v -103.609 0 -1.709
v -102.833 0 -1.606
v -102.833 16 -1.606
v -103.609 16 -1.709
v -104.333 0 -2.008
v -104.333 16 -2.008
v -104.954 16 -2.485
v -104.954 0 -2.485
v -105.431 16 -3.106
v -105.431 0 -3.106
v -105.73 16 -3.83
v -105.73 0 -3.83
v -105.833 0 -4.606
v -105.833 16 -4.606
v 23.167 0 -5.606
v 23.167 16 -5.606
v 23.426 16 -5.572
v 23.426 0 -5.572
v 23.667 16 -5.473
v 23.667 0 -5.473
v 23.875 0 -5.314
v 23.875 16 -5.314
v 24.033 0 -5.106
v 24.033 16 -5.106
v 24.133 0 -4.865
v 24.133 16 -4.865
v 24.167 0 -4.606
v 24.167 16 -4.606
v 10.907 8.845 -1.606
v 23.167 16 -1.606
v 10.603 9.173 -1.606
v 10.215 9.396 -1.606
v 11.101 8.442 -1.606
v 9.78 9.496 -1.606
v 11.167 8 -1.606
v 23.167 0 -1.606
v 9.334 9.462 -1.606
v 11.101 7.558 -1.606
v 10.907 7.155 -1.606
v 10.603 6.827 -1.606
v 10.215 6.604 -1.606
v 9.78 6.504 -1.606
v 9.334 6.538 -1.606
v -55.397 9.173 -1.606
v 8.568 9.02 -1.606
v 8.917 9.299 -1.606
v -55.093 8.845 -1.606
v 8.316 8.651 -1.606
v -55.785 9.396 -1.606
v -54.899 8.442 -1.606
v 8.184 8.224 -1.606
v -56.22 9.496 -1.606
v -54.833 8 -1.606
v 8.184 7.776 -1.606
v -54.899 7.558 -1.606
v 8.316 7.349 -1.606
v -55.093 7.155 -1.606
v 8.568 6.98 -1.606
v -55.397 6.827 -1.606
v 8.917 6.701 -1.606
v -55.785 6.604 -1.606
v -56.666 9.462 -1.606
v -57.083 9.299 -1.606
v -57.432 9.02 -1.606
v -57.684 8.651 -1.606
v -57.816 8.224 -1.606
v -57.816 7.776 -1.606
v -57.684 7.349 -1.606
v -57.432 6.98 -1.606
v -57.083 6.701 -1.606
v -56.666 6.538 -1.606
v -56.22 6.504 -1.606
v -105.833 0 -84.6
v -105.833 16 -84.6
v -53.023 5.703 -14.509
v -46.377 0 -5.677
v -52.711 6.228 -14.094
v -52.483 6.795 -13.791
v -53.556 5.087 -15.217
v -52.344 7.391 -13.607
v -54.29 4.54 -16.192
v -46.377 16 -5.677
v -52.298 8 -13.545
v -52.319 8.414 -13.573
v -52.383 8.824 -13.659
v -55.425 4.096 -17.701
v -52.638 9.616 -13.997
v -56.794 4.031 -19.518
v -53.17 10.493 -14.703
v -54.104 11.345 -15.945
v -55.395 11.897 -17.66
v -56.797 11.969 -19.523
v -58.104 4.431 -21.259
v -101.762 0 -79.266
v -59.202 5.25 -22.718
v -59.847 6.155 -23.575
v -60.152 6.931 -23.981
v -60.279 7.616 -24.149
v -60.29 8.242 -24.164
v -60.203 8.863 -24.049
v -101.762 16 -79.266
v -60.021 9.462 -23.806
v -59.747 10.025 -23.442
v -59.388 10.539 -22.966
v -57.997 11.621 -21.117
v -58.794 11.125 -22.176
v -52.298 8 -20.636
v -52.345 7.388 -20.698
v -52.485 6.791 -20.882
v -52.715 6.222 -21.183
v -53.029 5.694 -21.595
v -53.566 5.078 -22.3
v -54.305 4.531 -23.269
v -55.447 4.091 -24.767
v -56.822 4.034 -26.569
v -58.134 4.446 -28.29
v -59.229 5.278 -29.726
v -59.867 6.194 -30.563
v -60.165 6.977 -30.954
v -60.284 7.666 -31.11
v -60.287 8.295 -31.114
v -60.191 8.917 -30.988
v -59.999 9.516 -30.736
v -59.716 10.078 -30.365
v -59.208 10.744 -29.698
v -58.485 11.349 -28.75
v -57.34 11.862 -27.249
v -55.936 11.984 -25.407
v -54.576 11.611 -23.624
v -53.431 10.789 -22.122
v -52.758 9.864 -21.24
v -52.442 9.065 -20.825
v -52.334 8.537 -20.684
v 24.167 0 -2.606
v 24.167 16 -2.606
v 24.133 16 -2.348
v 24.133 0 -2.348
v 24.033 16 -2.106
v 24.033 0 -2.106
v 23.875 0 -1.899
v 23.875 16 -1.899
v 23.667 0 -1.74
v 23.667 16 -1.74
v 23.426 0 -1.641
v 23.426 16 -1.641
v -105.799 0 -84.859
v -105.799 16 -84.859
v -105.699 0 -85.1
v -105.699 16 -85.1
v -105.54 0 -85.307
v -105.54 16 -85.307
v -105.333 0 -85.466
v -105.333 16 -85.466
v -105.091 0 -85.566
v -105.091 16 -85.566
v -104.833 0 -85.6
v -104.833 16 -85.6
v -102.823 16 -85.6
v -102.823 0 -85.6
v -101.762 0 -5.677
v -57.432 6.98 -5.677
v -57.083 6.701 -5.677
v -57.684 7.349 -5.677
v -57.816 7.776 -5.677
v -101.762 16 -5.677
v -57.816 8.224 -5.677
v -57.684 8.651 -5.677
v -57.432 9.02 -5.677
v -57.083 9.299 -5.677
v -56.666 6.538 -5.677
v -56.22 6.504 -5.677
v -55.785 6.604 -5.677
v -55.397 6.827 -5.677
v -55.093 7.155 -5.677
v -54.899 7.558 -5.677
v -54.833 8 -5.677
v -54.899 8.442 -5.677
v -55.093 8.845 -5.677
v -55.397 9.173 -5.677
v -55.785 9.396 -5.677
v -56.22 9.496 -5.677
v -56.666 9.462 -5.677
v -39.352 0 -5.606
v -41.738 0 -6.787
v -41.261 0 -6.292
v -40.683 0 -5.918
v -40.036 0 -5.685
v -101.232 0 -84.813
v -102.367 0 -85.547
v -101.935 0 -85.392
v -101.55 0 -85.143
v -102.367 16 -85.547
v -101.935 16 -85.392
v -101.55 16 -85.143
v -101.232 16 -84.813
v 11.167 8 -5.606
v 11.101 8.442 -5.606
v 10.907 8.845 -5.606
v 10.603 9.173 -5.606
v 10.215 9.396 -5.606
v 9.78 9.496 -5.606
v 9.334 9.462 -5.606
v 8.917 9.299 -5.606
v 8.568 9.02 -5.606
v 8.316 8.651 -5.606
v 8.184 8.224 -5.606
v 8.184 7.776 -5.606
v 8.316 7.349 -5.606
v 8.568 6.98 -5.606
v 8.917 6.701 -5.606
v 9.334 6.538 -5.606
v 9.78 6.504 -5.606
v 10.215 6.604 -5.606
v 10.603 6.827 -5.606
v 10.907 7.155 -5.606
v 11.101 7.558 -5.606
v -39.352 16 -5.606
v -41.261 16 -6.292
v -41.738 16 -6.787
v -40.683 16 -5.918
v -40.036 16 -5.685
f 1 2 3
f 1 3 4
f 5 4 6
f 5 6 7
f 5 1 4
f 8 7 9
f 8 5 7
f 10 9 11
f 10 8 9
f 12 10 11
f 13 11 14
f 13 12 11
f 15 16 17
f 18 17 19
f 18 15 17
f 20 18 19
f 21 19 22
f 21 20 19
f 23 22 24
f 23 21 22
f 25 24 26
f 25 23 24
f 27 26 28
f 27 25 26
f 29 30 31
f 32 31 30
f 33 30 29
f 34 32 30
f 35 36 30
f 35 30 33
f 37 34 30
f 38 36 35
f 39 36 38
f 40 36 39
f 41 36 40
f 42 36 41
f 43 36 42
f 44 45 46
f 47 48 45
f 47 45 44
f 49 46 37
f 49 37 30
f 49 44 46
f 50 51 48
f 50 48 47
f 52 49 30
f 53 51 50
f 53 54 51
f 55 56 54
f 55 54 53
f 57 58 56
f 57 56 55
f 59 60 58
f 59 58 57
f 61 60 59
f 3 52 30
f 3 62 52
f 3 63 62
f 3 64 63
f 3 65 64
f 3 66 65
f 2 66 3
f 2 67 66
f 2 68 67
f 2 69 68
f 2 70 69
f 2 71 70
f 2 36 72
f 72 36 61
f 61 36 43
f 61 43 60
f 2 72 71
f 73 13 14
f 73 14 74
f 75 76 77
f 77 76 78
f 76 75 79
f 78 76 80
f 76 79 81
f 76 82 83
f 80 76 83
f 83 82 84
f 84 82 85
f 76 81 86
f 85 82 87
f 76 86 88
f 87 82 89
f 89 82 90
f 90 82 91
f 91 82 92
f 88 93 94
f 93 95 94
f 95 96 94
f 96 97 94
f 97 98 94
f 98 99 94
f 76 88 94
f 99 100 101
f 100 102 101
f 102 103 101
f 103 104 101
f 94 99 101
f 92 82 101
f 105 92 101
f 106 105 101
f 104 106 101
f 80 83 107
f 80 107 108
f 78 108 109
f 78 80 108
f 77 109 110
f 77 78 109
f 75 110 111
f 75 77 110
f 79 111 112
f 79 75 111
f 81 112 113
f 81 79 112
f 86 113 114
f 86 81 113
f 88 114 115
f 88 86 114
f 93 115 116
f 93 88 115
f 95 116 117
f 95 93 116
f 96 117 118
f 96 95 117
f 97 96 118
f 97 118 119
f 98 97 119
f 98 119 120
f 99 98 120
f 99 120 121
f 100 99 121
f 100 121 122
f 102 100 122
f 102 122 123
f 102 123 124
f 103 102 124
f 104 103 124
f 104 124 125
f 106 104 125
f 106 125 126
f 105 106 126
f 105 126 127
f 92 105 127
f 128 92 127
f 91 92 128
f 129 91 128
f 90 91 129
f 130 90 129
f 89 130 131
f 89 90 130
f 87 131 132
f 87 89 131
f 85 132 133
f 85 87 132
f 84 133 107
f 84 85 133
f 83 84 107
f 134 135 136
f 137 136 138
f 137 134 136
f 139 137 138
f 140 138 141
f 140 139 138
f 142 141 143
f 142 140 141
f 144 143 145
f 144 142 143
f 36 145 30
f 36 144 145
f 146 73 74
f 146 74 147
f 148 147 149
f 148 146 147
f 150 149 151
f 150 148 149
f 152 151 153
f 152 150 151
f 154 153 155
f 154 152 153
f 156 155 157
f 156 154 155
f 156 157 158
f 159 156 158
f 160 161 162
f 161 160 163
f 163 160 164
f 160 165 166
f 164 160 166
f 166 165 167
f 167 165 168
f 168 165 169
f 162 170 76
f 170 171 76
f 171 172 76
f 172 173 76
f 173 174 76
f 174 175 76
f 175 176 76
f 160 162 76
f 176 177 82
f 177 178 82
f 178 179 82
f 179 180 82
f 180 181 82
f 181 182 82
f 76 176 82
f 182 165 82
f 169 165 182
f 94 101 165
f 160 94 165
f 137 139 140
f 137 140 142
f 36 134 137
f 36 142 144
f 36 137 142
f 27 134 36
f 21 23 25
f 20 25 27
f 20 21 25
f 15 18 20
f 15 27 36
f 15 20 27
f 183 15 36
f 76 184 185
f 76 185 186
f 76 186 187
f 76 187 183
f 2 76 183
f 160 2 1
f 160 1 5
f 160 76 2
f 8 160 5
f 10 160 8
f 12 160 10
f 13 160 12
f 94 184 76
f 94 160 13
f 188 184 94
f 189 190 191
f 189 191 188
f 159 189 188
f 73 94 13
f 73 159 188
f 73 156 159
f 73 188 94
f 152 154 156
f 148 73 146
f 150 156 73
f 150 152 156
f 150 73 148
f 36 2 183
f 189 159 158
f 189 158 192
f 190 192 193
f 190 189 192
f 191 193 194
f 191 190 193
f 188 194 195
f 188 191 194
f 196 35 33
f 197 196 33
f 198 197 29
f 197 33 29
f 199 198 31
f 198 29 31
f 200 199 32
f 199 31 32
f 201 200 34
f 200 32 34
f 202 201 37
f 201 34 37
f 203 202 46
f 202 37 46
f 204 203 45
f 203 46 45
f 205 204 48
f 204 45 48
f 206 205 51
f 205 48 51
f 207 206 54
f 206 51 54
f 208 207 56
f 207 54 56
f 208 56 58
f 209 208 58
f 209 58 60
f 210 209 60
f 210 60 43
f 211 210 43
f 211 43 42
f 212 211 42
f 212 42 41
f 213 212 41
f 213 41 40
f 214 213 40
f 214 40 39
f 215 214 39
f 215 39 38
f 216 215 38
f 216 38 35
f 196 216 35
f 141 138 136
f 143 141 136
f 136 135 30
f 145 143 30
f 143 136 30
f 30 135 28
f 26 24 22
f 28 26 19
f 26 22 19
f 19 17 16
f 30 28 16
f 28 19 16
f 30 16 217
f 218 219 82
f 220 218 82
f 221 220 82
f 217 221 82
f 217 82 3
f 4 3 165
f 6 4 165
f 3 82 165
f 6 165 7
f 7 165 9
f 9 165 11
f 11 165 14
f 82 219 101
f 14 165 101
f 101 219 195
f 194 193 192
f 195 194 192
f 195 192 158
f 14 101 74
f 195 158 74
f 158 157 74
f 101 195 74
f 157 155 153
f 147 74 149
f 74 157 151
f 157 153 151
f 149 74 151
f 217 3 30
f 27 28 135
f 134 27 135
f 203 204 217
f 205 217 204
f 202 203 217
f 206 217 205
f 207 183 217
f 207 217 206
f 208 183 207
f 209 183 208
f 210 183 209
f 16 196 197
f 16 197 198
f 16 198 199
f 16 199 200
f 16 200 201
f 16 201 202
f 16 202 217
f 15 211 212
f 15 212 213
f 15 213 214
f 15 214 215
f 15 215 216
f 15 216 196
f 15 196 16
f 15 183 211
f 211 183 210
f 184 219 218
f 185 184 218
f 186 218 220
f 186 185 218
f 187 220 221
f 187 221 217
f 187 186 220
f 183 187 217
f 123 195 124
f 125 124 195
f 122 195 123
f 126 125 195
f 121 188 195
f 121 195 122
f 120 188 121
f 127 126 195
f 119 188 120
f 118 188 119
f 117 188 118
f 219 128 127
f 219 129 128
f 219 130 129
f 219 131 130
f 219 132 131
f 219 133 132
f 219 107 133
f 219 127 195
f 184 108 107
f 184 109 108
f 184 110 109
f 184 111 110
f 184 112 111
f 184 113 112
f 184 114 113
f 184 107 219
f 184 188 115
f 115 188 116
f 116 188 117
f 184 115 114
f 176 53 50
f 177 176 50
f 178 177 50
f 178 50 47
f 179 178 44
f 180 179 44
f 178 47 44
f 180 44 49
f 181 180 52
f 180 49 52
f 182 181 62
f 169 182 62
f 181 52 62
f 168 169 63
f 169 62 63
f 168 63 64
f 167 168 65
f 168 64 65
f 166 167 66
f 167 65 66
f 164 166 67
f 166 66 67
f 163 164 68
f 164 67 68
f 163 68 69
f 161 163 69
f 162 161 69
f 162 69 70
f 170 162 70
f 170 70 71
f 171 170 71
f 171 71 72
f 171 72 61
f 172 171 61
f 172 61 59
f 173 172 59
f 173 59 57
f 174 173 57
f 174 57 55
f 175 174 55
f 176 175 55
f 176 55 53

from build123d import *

# Parameters (mm, degrees)
BOSS_EXTRUDE4_DEPTH = 16
CUT_EXTRUDE1_DEPTH  = 16
SKETCH4_R           = 1.5
CUT_EXTRUDE3_DEPTH  = 16
SKETCH6_R           = 4
CUT_EXTRUDE4_DEPTH  = 134.582030626


with BuildPart() as part:
    # Sketch1 → Boss-Extrude4 (new body)
    with BuildSketch(Plane(origin=(0, 0, 0), x_dir=(1, 0, 0), z_dir=(0, 1, 0))):
        with BuildLine():
            Line((-101.232266869, 84.812685314), (-41.738030485, 6.78745727))
            ThreePointArc((-41.738030485, 6.78745727), (-40.683381354, 5.917890449), (-39.352420031, 5.606485241))
            Line((-39.352420031, 5.606485241), (23.167405683, 5.606485241))
            ThreePointArc((23.167405683, 5.606485241), (23.874512464, 5.313592022), (24.167405683, 4.606485241))
            Line((24.167405683, 4.606485241), (24.167405683, 2.606485241))
            ThreePointArc((24.167405683, 2.606485241), (23.874512464, 1.89937846), (23.167405683, 1.606485241))
            Line((23.167405683, 1.606485241), (-102.832594317, 1.606485241))
            ThreePointArc((-102.832594317, 1.606485241), (-104.95391466, 2.485164898), (-105.832594317, 4.606485241))
            Line((-105.832594317, 4.606485241), (-105.832594317, 5.6))
            Line((-105.832594317, 5.6), (-105.832594317, 84.6))
            ThreePointArc((-105.832594317, 84.6), (-105.539701098, 85.307106781), (-104.832594317, 85.6))
            Line((-104.832594317, 85.6), (-102.822673838, 85.6))
            ThreePointArc((-102.822673838, 85.6), (-101.93536629, 85.392396528), (-101.232266869, 84.812685314))
        make_face()
    extrude(amount=BOSS_EXTRUDE4_DEPTH)

    # Sketch2 → Cut-Extrude1 (cut)
    with BuildSketch(Plane(origin=(0, 16, 0), x_dir=(1, 0, 0), z_dir=(0, 1, 0))):
        Polygon((-101.761672648, 5.67740691), (-46.376523222, 5.67740691), (-101.761672648, 79.266350208), align=None)
    extrude(amount=-CUT_EXTRUDE1_DEPTH, mode=Mode.SUBTRACT)

    # Sketch4 → Cut-Extrude3 (cut)
    with BuildSketch(Plane.XY.offset(-1.606485241)):
        with Locations((9.667405683, 8)):
            Circle(SKETCH4_R)
        with Locations((-56.332594317, 8)):
            Circle(SKETCH4_R)
    extrude(amount=-CUT_EXTRUDE3_DEPTH, mode=Mode.SUBTRACT)

    # Sketch6 → Cut-Extrude4 (cut, through all)
    with BuildSketch(Plane(origin=(0, 0, -5.67740691), x_dir=(-1, 0, 0), z_dir=(0, 0, -1))):
        with Locations(Location((56.297582792, 8, 0), (0, 0, 180))):
            Circle(SKETCH6_R)
    extrude(amount=CUT_EXTRUDE4_DEPTH, mode=Mode.SUBTRACT)


solid = part.part
